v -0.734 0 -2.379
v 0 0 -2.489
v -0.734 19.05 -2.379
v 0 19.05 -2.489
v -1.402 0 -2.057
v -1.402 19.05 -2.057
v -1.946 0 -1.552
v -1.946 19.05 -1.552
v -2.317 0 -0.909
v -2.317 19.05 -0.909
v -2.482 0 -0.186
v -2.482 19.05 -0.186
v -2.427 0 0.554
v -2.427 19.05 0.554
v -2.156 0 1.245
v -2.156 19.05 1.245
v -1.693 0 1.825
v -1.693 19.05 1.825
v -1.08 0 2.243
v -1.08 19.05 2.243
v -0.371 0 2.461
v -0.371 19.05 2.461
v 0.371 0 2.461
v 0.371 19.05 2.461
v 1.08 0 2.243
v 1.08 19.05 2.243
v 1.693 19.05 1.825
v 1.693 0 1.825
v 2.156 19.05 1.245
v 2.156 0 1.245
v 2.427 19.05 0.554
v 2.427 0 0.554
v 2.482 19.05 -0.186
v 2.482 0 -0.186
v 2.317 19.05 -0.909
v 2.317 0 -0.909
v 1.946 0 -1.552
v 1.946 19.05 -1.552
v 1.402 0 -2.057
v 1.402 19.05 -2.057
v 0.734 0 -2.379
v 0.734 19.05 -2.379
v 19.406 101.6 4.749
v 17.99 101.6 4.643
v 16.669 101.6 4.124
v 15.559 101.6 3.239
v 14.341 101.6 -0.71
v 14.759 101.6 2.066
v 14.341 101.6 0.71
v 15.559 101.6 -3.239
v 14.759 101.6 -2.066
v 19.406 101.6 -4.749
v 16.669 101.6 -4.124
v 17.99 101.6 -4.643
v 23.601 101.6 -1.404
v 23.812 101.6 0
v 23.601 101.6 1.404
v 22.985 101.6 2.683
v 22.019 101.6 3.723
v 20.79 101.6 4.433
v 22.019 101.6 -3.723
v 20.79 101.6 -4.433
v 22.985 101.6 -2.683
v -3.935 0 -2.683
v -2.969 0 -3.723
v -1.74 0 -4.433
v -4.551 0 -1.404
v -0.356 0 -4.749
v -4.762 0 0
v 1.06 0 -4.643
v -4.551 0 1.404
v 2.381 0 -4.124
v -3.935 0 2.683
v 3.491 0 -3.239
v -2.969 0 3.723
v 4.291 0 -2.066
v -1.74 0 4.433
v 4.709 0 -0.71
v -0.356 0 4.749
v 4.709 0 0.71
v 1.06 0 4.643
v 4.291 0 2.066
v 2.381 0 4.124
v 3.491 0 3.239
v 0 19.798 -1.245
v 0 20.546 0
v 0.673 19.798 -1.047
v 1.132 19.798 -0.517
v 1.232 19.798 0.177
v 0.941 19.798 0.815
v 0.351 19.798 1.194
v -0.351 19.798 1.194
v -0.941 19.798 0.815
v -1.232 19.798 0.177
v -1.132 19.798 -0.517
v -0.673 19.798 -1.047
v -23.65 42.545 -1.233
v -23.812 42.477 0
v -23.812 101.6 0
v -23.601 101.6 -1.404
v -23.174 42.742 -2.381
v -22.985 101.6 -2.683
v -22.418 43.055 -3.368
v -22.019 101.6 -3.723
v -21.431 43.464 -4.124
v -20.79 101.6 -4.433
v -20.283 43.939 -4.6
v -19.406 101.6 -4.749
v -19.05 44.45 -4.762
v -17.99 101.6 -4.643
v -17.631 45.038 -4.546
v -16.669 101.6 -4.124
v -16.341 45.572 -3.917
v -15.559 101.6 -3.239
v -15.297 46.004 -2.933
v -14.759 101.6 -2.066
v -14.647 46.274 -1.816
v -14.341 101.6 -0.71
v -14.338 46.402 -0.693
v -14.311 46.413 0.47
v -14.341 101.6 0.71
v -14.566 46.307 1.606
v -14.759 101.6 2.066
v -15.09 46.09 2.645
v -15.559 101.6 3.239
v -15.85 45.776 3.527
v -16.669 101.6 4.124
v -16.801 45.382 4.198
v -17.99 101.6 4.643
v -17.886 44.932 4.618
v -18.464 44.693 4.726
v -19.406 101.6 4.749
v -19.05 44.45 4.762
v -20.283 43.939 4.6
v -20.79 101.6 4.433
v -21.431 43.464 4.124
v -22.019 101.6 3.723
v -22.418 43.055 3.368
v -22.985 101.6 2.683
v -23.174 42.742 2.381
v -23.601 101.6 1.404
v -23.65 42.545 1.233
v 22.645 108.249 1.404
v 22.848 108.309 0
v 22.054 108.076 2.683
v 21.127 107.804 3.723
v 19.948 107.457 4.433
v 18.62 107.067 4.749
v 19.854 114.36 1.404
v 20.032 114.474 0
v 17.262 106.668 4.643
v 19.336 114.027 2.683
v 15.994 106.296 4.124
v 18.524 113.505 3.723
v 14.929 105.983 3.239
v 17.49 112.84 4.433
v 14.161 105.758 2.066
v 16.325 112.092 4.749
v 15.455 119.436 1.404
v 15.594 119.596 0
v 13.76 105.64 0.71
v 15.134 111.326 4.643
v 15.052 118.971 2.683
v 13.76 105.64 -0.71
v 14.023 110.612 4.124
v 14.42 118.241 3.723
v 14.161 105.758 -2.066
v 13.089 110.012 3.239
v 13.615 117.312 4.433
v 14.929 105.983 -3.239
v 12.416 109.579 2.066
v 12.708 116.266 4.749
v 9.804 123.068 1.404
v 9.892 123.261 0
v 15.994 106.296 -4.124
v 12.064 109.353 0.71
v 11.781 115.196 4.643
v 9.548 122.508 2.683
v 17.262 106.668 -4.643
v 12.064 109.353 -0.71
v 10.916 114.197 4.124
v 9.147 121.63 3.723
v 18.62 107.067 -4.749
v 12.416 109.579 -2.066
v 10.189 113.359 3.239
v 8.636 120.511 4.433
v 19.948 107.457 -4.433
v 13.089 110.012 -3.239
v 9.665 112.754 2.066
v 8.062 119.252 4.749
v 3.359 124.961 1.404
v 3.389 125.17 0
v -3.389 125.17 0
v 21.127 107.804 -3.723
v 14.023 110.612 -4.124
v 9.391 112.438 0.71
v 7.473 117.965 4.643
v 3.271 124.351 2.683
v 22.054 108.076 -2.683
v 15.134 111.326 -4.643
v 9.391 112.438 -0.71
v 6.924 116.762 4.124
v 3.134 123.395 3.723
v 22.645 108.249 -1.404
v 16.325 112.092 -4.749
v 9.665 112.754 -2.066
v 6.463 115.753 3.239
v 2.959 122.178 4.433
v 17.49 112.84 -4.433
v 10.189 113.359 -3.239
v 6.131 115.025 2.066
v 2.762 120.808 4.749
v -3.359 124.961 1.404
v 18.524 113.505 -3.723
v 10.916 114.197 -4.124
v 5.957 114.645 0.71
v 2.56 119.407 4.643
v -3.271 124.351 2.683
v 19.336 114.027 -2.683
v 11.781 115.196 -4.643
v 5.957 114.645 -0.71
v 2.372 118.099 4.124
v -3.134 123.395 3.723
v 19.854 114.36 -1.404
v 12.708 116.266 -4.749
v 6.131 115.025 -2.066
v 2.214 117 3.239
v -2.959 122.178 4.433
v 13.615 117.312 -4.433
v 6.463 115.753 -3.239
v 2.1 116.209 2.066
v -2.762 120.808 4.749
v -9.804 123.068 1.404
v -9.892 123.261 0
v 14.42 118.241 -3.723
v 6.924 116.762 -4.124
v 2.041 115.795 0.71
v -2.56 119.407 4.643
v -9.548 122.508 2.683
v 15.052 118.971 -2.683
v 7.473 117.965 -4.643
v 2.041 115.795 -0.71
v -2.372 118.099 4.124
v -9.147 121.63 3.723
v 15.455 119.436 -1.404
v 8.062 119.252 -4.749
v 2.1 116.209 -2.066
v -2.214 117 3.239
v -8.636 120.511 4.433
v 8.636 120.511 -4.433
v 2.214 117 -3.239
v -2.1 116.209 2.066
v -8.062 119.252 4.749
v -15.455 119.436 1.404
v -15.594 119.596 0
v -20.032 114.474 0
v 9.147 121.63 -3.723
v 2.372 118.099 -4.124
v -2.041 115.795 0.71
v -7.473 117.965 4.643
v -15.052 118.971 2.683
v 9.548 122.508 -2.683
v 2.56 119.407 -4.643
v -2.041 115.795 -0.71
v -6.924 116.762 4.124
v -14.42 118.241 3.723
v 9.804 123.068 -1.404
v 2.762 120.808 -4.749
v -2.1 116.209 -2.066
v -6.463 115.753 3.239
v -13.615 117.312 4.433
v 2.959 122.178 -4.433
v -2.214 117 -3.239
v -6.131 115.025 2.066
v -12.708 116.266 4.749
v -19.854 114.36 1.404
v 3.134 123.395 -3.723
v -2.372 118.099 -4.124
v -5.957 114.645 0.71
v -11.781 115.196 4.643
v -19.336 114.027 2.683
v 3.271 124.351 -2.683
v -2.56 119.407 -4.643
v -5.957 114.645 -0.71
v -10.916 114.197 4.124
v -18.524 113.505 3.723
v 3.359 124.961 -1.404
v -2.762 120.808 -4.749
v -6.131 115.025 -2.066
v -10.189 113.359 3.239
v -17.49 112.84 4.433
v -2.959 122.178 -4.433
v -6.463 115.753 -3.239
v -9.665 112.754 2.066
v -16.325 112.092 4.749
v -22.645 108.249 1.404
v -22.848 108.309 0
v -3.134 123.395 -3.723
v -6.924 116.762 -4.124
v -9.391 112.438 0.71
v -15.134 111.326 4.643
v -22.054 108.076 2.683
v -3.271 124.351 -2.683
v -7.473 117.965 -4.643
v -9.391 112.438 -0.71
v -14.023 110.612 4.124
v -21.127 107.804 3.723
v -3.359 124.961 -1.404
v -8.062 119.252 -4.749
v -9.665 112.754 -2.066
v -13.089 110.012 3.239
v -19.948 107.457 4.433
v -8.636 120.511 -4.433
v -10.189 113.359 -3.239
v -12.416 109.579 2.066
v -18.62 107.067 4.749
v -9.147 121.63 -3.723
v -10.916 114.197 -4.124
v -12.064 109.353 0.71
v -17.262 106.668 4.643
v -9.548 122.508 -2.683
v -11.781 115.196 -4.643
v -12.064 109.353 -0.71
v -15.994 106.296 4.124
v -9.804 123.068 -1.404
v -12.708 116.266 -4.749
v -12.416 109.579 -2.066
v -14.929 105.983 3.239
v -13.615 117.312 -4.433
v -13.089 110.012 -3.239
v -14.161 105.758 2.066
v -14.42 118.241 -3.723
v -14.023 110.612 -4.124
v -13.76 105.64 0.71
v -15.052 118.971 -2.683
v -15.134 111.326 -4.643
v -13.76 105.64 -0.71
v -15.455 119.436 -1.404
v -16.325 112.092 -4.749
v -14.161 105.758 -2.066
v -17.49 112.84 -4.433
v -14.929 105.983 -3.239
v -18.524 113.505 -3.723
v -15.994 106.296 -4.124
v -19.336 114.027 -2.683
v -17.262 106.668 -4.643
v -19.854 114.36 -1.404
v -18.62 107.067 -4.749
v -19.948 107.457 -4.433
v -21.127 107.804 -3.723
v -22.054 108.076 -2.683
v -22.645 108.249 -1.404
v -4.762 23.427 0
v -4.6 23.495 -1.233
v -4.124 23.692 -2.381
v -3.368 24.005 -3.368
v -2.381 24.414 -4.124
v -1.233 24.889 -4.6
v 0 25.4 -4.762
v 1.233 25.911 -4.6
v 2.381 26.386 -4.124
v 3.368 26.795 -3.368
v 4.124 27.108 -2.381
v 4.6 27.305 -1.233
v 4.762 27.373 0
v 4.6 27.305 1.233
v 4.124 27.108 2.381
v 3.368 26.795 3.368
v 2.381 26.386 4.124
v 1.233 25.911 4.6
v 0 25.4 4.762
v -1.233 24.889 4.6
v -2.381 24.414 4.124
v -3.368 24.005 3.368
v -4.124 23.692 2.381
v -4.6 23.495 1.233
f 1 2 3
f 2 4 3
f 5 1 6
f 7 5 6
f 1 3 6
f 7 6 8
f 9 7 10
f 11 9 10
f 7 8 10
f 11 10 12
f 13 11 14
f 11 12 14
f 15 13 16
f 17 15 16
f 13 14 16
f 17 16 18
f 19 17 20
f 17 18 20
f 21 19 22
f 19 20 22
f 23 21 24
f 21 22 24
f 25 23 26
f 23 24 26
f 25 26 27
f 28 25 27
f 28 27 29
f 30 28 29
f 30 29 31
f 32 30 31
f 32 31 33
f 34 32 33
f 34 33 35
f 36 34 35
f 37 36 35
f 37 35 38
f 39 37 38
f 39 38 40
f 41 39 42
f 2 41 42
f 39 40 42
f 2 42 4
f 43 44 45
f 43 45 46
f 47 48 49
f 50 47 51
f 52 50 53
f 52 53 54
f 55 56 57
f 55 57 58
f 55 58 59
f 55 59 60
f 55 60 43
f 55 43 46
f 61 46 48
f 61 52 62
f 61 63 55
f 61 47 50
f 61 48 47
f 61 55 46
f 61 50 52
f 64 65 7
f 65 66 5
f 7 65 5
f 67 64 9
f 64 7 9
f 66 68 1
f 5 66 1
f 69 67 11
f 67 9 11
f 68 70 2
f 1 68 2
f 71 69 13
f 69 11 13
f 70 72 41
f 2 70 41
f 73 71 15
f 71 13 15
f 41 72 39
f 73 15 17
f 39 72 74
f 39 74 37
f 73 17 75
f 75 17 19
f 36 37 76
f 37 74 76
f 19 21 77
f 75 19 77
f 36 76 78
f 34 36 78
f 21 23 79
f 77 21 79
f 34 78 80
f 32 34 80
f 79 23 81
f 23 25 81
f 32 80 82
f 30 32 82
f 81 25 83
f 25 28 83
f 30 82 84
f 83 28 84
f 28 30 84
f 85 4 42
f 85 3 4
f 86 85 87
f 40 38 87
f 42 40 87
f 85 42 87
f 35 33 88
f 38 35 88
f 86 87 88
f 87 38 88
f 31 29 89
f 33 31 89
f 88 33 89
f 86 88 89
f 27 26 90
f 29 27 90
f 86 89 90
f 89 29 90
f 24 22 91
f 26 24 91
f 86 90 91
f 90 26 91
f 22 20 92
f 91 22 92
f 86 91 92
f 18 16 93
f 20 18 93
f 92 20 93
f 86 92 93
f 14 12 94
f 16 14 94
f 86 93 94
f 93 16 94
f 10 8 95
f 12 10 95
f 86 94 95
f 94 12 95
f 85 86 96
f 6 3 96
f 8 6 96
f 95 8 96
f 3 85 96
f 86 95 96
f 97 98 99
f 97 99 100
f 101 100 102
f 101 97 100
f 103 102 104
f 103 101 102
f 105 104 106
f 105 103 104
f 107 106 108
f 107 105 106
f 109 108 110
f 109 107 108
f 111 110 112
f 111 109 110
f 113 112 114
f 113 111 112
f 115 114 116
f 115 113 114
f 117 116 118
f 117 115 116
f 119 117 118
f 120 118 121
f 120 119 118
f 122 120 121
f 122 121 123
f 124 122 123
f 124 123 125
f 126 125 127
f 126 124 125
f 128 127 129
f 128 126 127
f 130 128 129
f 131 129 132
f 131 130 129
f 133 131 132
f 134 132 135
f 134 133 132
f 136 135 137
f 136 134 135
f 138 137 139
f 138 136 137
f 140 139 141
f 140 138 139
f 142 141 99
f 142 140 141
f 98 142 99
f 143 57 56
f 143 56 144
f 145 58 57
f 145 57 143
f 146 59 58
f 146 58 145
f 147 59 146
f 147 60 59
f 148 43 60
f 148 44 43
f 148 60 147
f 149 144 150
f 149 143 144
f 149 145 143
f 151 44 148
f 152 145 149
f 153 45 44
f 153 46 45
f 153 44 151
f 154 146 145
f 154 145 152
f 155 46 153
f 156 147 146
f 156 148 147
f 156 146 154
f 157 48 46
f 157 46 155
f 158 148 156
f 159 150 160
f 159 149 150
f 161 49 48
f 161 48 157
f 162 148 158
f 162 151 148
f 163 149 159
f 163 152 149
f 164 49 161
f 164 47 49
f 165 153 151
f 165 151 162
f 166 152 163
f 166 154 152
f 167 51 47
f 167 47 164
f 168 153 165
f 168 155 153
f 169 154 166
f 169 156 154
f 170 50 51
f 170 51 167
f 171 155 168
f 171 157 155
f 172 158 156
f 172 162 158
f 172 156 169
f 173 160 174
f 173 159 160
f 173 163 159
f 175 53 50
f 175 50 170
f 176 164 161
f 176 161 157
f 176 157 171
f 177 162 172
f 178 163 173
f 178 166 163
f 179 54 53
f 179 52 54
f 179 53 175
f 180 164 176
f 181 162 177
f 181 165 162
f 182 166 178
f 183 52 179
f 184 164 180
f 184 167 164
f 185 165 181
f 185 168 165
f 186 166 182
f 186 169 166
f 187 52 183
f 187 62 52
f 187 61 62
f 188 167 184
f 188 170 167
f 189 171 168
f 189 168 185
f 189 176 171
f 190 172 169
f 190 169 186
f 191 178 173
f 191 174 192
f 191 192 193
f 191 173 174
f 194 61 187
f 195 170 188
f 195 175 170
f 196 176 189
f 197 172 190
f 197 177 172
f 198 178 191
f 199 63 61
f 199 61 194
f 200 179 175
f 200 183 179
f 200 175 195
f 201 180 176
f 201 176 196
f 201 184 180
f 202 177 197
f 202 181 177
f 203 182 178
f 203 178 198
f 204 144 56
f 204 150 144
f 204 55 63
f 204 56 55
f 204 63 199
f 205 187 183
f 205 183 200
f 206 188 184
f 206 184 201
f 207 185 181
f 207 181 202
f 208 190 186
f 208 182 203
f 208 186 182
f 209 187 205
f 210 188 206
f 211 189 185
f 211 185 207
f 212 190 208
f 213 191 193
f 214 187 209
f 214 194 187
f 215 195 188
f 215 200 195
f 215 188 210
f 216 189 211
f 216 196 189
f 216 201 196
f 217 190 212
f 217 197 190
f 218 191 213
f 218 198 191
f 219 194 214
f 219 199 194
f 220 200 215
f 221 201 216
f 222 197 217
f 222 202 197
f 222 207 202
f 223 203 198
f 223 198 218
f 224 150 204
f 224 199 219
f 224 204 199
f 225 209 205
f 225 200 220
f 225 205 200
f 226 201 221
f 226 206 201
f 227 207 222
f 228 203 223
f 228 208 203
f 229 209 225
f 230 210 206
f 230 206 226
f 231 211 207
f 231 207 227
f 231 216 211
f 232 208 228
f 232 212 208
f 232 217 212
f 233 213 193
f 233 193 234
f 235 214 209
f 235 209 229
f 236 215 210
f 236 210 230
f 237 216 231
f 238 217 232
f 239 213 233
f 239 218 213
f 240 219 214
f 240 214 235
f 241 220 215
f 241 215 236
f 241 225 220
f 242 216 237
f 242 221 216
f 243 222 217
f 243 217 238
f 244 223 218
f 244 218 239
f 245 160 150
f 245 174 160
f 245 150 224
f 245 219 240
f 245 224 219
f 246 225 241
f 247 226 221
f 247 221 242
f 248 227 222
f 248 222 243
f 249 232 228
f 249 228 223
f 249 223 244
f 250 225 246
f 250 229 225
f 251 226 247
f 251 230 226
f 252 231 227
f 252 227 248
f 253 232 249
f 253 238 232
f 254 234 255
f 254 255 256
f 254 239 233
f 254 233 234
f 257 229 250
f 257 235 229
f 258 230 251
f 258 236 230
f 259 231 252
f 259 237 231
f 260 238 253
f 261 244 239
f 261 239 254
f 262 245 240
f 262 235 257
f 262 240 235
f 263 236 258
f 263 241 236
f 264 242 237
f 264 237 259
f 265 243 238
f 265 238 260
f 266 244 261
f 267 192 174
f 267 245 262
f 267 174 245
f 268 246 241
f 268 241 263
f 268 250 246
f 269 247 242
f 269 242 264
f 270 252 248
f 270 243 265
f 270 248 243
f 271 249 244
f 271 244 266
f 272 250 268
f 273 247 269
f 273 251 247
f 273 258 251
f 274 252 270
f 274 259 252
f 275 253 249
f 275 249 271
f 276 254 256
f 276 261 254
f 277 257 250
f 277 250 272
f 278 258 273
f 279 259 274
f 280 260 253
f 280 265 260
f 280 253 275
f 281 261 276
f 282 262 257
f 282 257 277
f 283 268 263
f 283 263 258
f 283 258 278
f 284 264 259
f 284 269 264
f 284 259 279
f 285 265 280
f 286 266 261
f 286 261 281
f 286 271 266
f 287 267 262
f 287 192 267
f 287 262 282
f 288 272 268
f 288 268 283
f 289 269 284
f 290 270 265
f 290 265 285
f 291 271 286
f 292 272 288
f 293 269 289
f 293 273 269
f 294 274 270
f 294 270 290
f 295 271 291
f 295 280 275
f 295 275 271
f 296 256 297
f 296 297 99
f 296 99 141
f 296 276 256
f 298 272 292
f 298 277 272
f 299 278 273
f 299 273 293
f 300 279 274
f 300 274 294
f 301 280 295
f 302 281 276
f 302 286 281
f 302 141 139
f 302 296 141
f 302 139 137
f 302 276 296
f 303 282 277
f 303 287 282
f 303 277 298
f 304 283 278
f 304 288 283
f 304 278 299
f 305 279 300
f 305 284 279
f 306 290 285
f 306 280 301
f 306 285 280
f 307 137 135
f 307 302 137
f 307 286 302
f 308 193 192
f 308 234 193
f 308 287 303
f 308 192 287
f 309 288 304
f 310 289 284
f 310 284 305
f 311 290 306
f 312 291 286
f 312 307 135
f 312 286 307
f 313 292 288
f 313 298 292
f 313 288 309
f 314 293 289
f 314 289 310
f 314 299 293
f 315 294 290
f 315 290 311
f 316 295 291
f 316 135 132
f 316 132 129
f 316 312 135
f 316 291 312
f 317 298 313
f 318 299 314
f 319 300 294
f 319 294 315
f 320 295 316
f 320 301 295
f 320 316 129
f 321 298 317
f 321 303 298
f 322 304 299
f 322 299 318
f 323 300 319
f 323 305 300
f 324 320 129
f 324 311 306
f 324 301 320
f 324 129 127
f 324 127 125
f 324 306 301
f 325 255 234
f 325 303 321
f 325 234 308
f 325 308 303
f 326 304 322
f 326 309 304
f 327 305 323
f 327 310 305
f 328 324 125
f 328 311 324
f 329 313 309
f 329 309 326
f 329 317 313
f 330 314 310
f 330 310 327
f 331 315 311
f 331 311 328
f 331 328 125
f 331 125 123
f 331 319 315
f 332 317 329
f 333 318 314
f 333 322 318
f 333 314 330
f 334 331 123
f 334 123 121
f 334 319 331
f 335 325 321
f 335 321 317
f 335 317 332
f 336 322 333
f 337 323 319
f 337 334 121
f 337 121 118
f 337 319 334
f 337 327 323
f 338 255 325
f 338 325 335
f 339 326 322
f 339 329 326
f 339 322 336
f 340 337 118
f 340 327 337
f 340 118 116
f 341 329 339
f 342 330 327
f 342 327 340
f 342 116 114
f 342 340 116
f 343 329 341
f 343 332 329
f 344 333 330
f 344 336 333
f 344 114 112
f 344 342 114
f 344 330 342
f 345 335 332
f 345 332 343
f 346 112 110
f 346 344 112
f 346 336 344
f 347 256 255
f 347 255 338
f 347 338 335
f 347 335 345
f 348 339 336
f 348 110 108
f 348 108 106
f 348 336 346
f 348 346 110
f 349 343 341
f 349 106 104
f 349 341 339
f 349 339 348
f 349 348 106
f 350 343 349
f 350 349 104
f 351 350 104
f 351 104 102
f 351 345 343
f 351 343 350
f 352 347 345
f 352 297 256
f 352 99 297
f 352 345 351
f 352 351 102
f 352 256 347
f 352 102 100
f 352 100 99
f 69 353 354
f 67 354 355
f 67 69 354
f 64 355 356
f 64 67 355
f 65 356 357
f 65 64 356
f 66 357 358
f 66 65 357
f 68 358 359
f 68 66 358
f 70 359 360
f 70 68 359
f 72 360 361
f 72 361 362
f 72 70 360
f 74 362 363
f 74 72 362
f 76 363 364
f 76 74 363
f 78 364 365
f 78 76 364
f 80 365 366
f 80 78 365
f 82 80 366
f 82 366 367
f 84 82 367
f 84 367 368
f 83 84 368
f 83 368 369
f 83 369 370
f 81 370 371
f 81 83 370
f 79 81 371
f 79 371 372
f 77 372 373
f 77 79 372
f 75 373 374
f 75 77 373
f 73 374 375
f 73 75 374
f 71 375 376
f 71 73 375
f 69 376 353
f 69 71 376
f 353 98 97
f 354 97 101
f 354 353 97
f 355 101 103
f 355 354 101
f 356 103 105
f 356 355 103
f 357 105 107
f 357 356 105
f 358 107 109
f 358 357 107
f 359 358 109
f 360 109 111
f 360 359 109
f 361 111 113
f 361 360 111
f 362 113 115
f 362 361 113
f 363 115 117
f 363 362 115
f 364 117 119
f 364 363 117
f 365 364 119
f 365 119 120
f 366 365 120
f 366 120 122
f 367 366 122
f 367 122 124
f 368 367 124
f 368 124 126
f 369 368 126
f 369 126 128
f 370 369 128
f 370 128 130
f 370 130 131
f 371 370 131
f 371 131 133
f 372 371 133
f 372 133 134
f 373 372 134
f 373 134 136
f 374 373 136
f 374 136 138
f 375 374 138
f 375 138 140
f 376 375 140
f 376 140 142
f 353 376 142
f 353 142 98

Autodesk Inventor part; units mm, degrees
ref_plane "YZ Plane" through (0, 0, 0) normal (1, 0, 0) x (0, 1, 0)
ref_plane "XZ Plane" through (0, 0, 0) normal (0, 1, 0) x (-1, 0, 0)
ref_plane "XY Plane" through (0, 0, 0) normal (0, 0, 1) x (1, 0, 0)
sketch "Sketch1" plane through (0, 0, 0) normal (0, 0, 1) x (1, 0, 0)
  arc A0 (19.05, 101.6) -> (-19.05, 101.6) centre (0, 101.6) ccw
  line L0 (-19.05, 101.6) -> (-19.05, 44.45)
  line L1 (-19.05, 44.45) -> (0, 25.4)
  line L2 (0, 25.4) -> (0, 0)
  dimension "d1" = 19.05
  dimension "d2" = 45
  dimension "d5" = 25.4
  dimension "d6" = 101.6
sketch "Sketch2" plane through (0, 0, 0) normal (0, 1, 0) x (-1, 0, 0)
  circle A0 centre (0, 0) radius 4.7625
  dimension "d7" = 9.525
sweep "Sweep1" add profiles "Sketch2" path "Sketch1"
sketch "Sketch3" plane through (0, 0, 0) normal (0, -1, 0) x (1, 0, 0)
  point P0 (0, 0)
  point P1 (0, 0)
hole "Hole1" at (0, 0, 0) direction (0, 1, 0) diameter 4.9784 depth 19.05 tip angle 118
